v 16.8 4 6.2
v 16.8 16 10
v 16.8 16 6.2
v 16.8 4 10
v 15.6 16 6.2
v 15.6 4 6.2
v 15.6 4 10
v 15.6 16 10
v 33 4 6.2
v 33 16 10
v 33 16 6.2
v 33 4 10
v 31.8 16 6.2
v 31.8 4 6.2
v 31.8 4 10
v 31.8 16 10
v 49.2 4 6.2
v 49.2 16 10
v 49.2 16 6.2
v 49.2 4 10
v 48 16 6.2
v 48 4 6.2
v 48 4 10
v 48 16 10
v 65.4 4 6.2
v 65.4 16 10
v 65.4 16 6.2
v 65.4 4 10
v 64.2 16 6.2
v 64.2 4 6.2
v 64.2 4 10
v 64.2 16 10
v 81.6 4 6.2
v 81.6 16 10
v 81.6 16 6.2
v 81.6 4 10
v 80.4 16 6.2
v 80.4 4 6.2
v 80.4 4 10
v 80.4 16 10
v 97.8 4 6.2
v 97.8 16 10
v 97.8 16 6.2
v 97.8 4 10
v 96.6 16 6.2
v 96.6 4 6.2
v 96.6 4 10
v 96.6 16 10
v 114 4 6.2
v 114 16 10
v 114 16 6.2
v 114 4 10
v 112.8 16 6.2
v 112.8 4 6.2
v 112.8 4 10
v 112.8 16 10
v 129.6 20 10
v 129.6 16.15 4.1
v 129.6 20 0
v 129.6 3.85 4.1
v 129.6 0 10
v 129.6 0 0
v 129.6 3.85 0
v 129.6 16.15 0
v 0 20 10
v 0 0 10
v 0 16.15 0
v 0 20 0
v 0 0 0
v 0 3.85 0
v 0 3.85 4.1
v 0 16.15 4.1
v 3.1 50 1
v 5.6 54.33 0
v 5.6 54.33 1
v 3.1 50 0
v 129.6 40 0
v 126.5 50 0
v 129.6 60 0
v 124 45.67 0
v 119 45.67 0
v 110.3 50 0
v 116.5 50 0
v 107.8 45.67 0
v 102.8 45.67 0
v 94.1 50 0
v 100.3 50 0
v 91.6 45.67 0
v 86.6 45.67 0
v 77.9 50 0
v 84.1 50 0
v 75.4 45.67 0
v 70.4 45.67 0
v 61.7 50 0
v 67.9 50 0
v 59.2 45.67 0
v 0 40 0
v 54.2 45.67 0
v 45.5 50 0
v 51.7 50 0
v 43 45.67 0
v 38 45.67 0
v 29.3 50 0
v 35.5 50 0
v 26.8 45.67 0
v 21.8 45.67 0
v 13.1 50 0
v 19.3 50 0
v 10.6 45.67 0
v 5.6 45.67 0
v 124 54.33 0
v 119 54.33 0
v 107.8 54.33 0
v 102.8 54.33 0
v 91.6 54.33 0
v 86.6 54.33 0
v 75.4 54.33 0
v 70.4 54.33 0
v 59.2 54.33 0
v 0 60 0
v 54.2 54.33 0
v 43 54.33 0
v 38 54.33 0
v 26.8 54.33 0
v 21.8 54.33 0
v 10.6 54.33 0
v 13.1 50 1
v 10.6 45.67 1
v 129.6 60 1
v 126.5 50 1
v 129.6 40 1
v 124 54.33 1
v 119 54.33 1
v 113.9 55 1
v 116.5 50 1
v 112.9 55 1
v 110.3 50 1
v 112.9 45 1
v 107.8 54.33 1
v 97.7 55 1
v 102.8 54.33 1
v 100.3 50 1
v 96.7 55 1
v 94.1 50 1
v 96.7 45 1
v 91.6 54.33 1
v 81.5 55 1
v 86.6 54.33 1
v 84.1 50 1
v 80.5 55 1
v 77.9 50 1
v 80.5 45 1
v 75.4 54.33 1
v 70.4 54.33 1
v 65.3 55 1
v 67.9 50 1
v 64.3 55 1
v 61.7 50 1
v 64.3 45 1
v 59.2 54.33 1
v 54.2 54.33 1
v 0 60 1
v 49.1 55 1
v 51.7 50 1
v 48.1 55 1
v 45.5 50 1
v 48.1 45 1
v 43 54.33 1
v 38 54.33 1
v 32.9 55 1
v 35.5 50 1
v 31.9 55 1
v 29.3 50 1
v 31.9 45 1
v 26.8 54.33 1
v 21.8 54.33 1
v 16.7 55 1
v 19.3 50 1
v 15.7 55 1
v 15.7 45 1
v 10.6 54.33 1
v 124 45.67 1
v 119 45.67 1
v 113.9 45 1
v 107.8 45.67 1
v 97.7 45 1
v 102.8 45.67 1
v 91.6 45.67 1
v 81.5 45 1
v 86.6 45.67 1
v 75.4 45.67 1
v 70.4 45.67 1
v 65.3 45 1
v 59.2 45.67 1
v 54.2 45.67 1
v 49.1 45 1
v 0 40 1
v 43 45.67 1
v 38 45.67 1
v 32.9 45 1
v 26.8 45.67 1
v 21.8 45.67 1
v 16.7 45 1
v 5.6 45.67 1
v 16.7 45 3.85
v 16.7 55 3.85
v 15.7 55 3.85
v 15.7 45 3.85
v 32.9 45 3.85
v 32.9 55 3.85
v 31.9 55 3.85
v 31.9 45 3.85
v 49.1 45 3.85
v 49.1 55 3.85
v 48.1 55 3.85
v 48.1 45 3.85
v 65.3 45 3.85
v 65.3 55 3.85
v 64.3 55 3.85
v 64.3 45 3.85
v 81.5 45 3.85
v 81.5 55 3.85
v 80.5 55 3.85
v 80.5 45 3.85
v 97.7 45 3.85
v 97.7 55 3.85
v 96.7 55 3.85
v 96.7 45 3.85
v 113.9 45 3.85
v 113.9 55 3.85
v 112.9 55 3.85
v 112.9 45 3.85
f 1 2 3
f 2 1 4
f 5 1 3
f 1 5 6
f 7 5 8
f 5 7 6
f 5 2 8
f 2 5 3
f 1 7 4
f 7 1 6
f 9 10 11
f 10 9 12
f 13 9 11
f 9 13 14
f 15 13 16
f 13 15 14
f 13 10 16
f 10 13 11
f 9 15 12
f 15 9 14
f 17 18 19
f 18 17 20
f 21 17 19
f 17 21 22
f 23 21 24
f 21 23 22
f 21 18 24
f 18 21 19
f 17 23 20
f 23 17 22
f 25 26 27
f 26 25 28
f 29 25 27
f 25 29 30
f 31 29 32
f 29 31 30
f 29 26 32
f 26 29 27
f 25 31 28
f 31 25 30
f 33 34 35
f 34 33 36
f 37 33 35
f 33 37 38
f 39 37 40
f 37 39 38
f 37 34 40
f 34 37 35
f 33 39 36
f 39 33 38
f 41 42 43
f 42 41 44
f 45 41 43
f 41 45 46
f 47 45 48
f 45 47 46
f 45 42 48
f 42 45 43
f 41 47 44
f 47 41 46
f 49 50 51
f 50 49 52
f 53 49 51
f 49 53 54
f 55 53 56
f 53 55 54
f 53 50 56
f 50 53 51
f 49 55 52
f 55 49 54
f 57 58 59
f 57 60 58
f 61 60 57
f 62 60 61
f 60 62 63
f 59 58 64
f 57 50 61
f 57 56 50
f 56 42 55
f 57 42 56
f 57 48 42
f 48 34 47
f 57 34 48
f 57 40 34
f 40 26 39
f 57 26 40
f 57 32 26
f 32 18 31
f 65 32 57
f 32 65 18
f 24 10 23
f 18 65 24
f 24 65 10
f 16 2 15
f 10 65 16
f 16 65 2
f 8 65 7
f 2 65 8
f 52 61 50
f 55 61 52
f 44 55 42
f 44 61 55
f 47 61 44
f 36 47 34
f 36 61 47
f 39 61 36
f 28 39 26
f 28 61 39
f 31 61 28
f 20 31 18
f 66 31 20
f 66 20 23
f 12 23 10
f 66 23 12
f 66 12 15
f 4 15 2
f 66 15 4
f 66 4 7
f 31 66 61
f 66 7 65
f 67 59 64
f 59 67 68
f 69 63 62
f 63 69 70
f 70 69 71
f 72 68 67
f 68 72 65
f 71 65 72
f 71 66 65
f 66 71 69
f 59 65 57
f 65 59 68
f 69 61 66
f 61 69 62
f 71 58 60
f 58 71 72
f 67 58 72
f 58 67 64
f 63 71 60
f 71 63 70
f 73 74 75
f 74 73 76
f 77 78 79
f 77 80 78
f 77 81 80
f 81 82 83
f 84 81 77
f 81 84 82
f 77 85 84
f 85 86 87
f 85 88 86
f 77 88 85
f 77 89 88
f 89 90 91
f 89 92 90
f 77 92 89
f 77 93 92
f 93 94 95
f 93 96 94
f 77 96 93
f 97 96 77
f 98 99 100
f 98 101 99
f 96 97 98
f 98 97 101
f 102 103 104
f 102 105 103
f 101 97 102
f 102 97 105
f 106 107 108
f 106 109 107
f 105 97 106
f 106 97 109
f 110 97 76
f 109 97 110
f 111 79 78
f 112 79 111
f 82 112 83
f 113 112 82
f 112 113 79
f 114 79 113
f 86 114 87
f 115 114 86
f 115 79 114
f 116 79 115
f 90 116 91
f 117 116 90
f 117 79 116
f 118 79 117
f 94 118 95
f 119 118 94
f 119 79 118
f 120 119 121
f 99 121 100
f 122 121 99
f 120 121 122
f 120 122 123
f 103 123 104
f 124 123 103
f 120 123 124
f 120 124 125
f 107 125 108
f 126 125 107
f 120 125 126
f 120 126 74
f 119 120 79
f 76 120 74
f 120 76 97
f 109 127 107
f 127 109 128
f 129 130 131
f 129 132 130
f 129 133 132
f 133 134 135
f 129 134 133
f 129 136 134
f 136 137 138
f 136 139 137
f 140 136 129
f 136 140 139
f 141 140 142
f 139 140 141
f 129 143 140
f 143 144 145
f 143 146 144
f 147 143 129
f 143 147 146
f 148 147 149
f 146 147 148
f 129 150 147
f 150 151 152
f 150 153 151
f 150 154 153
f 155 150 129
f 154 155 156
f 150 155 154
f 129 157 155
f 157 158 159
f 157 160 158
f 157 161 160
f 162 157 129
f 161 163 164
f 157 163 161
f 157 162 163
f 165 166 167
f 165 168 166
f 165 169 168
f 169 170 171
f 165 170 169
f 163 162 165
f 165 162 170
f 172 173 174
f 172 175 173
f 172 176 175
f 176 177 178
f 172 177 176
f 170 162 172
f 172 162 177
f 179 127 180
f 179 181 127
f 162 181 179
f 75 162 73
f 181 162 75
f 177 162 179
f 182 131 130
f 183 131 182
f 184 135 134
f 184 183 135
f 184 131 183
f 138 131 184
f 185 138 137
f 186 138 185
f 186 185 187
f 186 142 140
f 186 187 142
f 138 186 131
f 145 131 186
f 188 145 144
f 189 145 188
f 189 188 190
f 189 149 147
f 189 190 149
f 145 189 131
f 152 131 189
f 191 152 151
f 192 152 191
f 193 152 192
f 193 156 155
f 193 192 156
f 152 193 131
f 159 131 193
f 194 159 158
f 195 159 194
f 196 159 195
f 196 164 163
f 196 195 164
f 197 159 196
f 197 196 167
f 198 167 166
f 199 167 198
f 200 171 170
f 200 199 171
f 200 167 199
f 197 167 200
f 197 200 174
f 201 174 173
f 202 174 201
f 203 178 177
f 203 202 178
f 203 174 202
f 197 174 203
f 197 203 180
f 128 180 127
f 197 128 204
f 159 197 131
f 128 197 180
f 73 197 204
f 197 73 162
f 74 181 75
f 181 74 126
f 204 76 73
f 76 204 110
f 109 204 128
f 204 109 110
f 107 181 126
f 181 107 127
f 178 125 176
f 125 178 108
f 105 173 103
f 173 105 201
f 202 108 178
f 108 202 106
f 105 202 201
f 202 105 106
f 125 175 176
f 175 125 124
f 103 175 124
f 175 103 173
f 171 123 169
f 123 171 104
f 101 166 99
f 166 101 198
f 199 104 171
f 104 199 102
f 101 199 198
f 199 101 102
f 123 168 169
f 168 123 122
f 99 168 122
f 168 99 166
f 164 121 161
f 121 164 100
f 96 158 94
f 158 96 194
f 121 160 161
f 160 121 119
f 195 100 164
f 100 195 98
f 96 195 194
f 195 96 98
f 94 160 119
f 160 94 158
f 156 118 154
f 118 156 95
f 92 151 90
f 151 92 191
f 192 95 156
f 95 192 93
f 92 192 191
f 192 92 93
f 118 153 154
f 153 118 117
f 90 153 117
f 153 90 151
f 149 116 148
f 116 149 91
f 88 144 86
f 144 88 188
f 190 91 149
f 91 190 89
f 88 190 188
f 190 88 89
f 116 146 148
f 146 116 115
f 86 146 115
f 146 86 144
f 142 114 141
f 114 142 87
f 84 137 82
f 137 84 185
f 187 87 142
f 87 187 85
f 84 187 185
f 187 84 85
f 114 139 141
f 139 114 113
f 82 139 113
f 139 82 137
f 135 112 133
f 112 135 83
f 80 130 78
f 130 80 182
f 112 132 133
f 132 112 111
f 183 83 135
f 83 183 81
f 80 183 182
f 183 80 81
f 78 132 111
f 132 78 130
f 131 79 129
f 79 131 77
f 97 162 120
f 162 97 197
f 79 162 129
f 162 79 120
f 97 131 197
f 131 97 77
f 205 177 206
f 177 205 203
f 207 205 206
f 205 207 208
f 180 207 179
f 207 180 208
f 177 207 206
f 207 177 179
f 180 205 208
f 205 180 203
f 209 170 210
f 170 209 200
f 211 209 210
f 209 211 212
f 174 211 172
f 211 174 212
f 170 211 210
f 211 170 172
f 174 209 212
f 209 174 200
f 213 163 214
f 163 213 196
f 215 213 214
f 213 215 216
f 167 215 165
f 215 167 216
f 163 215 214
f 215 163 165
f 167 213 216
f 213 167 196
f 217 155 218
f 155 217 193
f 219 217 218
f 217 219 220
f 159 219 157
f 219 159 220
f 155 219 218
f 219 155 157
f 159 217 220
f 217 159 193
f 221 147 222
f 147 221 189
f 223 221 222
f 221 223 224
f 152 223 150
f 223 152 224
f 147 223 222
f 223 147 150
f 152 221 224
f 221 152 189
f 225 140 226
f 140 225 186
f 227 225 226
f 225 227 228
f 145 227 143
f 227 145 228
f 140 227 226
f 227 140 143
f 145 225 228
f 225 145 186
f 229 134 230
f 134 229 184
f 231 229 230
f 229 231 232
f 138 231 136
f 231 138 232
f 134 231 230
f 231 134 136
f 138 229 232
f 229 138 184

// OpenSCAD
/*
 * NeoPixel strip + cover, fully parameterized
 */
 
NN = 8;             // Number of NeoPixels
IH = false;         // True to generate interior hexagons  

NR = 5;             // Radius of hexagon for a single NeoPixel

NC = 16.2;          // Center-to-center NeoPixel spacing (measured)
SZ = 4.1;           // Height of channel for NeoPixel strip (measured)
SY = 12.3;          // Width of channel for NeoPixel strip (measured)

TY = 20;            // Total width, must be > SY
TZ1 = 6;            // Height from base to top of hexagon plane
TZ2 = 10;           // Height from base to top of plate that covers hexagon plane
CZ1 = 1;            // Height of cover
DY  = 1;            // Thickness of divider
SLOT_GROW = 1.2;    // Growth factor for slots (literal wiggle room)

/*
 * Parameter sanity checks:
 */
 
assert(TY > SY, "TY must be greater than SY.");

/* 
 * Derived values:
 */
 
 NE = NC / 2;                       // Space from edge to center of first & last hexagon
 TX = NE + (NN - 1) * NC + NE;      // Total depth
 DZ = TZ1 - SZ;                     // Height of divider slot

 echo("NE=", NE);
 echo("TX=", TX);
 echo("DZ=", DZ);

/* 
 * Strip
 */
 
difference()
{
    // Main block
    cube([TX, TY, TZ2]);
    
    // Channel for NeoPixel strip
    translate([0, (TY - SY) / 2, 0])
    {
        cube([TX, SY, SZ]);
    }
    
    // Hexagons for NeoPixels
    for (n = [0 : 1 : NN - 1])
    {
        translate([NE + (n * NC), TY / 2, SZ])
        {
            linear_extrude(TZ1 - SZ)
            {
                if (IH)
                {
                    circle(NR, $fn = 6);
                }
            }
        }
    }
    
    // Slots for dividers between hexagons to block light
    for (n = [0 : 1 : NN - 2])
    {
        translate([NE + (n * NC) + (NC / 2), TY / 2, TZ2])
        {
            cube([DY * SLOT_GROW, (2 * NR) * SLOT_GROW, 4 * DZ], center=true);
        }
    }
}

/*
 * Cover:
 */

translate([0, 2 * TY, 0])
{
    difference()
    {
        // Main block
        cube([TX, TY, CZ1]);
        
        // Hexagons for NeoPixels
        for (n = [0 : 1 : NN - 1])
        {
            translate([NE + (n * NC), TY / 2, 0])
            {
                linear_extrude(CZ1)
                {
                    circle(NR, $fn = 6);
                }
            }
        }
    }
    
    // Dividers between hexagons
    for (n = [0 : 1 : NN - 2])
    {
        translate([NE + (n * NC) + (NC / 2), TY / 2, CZ1 + (DZ / 2)])
        {
            color("red") cube([DY, 2 * NR, 2 * DZ], center=true);
        }
    }
}
